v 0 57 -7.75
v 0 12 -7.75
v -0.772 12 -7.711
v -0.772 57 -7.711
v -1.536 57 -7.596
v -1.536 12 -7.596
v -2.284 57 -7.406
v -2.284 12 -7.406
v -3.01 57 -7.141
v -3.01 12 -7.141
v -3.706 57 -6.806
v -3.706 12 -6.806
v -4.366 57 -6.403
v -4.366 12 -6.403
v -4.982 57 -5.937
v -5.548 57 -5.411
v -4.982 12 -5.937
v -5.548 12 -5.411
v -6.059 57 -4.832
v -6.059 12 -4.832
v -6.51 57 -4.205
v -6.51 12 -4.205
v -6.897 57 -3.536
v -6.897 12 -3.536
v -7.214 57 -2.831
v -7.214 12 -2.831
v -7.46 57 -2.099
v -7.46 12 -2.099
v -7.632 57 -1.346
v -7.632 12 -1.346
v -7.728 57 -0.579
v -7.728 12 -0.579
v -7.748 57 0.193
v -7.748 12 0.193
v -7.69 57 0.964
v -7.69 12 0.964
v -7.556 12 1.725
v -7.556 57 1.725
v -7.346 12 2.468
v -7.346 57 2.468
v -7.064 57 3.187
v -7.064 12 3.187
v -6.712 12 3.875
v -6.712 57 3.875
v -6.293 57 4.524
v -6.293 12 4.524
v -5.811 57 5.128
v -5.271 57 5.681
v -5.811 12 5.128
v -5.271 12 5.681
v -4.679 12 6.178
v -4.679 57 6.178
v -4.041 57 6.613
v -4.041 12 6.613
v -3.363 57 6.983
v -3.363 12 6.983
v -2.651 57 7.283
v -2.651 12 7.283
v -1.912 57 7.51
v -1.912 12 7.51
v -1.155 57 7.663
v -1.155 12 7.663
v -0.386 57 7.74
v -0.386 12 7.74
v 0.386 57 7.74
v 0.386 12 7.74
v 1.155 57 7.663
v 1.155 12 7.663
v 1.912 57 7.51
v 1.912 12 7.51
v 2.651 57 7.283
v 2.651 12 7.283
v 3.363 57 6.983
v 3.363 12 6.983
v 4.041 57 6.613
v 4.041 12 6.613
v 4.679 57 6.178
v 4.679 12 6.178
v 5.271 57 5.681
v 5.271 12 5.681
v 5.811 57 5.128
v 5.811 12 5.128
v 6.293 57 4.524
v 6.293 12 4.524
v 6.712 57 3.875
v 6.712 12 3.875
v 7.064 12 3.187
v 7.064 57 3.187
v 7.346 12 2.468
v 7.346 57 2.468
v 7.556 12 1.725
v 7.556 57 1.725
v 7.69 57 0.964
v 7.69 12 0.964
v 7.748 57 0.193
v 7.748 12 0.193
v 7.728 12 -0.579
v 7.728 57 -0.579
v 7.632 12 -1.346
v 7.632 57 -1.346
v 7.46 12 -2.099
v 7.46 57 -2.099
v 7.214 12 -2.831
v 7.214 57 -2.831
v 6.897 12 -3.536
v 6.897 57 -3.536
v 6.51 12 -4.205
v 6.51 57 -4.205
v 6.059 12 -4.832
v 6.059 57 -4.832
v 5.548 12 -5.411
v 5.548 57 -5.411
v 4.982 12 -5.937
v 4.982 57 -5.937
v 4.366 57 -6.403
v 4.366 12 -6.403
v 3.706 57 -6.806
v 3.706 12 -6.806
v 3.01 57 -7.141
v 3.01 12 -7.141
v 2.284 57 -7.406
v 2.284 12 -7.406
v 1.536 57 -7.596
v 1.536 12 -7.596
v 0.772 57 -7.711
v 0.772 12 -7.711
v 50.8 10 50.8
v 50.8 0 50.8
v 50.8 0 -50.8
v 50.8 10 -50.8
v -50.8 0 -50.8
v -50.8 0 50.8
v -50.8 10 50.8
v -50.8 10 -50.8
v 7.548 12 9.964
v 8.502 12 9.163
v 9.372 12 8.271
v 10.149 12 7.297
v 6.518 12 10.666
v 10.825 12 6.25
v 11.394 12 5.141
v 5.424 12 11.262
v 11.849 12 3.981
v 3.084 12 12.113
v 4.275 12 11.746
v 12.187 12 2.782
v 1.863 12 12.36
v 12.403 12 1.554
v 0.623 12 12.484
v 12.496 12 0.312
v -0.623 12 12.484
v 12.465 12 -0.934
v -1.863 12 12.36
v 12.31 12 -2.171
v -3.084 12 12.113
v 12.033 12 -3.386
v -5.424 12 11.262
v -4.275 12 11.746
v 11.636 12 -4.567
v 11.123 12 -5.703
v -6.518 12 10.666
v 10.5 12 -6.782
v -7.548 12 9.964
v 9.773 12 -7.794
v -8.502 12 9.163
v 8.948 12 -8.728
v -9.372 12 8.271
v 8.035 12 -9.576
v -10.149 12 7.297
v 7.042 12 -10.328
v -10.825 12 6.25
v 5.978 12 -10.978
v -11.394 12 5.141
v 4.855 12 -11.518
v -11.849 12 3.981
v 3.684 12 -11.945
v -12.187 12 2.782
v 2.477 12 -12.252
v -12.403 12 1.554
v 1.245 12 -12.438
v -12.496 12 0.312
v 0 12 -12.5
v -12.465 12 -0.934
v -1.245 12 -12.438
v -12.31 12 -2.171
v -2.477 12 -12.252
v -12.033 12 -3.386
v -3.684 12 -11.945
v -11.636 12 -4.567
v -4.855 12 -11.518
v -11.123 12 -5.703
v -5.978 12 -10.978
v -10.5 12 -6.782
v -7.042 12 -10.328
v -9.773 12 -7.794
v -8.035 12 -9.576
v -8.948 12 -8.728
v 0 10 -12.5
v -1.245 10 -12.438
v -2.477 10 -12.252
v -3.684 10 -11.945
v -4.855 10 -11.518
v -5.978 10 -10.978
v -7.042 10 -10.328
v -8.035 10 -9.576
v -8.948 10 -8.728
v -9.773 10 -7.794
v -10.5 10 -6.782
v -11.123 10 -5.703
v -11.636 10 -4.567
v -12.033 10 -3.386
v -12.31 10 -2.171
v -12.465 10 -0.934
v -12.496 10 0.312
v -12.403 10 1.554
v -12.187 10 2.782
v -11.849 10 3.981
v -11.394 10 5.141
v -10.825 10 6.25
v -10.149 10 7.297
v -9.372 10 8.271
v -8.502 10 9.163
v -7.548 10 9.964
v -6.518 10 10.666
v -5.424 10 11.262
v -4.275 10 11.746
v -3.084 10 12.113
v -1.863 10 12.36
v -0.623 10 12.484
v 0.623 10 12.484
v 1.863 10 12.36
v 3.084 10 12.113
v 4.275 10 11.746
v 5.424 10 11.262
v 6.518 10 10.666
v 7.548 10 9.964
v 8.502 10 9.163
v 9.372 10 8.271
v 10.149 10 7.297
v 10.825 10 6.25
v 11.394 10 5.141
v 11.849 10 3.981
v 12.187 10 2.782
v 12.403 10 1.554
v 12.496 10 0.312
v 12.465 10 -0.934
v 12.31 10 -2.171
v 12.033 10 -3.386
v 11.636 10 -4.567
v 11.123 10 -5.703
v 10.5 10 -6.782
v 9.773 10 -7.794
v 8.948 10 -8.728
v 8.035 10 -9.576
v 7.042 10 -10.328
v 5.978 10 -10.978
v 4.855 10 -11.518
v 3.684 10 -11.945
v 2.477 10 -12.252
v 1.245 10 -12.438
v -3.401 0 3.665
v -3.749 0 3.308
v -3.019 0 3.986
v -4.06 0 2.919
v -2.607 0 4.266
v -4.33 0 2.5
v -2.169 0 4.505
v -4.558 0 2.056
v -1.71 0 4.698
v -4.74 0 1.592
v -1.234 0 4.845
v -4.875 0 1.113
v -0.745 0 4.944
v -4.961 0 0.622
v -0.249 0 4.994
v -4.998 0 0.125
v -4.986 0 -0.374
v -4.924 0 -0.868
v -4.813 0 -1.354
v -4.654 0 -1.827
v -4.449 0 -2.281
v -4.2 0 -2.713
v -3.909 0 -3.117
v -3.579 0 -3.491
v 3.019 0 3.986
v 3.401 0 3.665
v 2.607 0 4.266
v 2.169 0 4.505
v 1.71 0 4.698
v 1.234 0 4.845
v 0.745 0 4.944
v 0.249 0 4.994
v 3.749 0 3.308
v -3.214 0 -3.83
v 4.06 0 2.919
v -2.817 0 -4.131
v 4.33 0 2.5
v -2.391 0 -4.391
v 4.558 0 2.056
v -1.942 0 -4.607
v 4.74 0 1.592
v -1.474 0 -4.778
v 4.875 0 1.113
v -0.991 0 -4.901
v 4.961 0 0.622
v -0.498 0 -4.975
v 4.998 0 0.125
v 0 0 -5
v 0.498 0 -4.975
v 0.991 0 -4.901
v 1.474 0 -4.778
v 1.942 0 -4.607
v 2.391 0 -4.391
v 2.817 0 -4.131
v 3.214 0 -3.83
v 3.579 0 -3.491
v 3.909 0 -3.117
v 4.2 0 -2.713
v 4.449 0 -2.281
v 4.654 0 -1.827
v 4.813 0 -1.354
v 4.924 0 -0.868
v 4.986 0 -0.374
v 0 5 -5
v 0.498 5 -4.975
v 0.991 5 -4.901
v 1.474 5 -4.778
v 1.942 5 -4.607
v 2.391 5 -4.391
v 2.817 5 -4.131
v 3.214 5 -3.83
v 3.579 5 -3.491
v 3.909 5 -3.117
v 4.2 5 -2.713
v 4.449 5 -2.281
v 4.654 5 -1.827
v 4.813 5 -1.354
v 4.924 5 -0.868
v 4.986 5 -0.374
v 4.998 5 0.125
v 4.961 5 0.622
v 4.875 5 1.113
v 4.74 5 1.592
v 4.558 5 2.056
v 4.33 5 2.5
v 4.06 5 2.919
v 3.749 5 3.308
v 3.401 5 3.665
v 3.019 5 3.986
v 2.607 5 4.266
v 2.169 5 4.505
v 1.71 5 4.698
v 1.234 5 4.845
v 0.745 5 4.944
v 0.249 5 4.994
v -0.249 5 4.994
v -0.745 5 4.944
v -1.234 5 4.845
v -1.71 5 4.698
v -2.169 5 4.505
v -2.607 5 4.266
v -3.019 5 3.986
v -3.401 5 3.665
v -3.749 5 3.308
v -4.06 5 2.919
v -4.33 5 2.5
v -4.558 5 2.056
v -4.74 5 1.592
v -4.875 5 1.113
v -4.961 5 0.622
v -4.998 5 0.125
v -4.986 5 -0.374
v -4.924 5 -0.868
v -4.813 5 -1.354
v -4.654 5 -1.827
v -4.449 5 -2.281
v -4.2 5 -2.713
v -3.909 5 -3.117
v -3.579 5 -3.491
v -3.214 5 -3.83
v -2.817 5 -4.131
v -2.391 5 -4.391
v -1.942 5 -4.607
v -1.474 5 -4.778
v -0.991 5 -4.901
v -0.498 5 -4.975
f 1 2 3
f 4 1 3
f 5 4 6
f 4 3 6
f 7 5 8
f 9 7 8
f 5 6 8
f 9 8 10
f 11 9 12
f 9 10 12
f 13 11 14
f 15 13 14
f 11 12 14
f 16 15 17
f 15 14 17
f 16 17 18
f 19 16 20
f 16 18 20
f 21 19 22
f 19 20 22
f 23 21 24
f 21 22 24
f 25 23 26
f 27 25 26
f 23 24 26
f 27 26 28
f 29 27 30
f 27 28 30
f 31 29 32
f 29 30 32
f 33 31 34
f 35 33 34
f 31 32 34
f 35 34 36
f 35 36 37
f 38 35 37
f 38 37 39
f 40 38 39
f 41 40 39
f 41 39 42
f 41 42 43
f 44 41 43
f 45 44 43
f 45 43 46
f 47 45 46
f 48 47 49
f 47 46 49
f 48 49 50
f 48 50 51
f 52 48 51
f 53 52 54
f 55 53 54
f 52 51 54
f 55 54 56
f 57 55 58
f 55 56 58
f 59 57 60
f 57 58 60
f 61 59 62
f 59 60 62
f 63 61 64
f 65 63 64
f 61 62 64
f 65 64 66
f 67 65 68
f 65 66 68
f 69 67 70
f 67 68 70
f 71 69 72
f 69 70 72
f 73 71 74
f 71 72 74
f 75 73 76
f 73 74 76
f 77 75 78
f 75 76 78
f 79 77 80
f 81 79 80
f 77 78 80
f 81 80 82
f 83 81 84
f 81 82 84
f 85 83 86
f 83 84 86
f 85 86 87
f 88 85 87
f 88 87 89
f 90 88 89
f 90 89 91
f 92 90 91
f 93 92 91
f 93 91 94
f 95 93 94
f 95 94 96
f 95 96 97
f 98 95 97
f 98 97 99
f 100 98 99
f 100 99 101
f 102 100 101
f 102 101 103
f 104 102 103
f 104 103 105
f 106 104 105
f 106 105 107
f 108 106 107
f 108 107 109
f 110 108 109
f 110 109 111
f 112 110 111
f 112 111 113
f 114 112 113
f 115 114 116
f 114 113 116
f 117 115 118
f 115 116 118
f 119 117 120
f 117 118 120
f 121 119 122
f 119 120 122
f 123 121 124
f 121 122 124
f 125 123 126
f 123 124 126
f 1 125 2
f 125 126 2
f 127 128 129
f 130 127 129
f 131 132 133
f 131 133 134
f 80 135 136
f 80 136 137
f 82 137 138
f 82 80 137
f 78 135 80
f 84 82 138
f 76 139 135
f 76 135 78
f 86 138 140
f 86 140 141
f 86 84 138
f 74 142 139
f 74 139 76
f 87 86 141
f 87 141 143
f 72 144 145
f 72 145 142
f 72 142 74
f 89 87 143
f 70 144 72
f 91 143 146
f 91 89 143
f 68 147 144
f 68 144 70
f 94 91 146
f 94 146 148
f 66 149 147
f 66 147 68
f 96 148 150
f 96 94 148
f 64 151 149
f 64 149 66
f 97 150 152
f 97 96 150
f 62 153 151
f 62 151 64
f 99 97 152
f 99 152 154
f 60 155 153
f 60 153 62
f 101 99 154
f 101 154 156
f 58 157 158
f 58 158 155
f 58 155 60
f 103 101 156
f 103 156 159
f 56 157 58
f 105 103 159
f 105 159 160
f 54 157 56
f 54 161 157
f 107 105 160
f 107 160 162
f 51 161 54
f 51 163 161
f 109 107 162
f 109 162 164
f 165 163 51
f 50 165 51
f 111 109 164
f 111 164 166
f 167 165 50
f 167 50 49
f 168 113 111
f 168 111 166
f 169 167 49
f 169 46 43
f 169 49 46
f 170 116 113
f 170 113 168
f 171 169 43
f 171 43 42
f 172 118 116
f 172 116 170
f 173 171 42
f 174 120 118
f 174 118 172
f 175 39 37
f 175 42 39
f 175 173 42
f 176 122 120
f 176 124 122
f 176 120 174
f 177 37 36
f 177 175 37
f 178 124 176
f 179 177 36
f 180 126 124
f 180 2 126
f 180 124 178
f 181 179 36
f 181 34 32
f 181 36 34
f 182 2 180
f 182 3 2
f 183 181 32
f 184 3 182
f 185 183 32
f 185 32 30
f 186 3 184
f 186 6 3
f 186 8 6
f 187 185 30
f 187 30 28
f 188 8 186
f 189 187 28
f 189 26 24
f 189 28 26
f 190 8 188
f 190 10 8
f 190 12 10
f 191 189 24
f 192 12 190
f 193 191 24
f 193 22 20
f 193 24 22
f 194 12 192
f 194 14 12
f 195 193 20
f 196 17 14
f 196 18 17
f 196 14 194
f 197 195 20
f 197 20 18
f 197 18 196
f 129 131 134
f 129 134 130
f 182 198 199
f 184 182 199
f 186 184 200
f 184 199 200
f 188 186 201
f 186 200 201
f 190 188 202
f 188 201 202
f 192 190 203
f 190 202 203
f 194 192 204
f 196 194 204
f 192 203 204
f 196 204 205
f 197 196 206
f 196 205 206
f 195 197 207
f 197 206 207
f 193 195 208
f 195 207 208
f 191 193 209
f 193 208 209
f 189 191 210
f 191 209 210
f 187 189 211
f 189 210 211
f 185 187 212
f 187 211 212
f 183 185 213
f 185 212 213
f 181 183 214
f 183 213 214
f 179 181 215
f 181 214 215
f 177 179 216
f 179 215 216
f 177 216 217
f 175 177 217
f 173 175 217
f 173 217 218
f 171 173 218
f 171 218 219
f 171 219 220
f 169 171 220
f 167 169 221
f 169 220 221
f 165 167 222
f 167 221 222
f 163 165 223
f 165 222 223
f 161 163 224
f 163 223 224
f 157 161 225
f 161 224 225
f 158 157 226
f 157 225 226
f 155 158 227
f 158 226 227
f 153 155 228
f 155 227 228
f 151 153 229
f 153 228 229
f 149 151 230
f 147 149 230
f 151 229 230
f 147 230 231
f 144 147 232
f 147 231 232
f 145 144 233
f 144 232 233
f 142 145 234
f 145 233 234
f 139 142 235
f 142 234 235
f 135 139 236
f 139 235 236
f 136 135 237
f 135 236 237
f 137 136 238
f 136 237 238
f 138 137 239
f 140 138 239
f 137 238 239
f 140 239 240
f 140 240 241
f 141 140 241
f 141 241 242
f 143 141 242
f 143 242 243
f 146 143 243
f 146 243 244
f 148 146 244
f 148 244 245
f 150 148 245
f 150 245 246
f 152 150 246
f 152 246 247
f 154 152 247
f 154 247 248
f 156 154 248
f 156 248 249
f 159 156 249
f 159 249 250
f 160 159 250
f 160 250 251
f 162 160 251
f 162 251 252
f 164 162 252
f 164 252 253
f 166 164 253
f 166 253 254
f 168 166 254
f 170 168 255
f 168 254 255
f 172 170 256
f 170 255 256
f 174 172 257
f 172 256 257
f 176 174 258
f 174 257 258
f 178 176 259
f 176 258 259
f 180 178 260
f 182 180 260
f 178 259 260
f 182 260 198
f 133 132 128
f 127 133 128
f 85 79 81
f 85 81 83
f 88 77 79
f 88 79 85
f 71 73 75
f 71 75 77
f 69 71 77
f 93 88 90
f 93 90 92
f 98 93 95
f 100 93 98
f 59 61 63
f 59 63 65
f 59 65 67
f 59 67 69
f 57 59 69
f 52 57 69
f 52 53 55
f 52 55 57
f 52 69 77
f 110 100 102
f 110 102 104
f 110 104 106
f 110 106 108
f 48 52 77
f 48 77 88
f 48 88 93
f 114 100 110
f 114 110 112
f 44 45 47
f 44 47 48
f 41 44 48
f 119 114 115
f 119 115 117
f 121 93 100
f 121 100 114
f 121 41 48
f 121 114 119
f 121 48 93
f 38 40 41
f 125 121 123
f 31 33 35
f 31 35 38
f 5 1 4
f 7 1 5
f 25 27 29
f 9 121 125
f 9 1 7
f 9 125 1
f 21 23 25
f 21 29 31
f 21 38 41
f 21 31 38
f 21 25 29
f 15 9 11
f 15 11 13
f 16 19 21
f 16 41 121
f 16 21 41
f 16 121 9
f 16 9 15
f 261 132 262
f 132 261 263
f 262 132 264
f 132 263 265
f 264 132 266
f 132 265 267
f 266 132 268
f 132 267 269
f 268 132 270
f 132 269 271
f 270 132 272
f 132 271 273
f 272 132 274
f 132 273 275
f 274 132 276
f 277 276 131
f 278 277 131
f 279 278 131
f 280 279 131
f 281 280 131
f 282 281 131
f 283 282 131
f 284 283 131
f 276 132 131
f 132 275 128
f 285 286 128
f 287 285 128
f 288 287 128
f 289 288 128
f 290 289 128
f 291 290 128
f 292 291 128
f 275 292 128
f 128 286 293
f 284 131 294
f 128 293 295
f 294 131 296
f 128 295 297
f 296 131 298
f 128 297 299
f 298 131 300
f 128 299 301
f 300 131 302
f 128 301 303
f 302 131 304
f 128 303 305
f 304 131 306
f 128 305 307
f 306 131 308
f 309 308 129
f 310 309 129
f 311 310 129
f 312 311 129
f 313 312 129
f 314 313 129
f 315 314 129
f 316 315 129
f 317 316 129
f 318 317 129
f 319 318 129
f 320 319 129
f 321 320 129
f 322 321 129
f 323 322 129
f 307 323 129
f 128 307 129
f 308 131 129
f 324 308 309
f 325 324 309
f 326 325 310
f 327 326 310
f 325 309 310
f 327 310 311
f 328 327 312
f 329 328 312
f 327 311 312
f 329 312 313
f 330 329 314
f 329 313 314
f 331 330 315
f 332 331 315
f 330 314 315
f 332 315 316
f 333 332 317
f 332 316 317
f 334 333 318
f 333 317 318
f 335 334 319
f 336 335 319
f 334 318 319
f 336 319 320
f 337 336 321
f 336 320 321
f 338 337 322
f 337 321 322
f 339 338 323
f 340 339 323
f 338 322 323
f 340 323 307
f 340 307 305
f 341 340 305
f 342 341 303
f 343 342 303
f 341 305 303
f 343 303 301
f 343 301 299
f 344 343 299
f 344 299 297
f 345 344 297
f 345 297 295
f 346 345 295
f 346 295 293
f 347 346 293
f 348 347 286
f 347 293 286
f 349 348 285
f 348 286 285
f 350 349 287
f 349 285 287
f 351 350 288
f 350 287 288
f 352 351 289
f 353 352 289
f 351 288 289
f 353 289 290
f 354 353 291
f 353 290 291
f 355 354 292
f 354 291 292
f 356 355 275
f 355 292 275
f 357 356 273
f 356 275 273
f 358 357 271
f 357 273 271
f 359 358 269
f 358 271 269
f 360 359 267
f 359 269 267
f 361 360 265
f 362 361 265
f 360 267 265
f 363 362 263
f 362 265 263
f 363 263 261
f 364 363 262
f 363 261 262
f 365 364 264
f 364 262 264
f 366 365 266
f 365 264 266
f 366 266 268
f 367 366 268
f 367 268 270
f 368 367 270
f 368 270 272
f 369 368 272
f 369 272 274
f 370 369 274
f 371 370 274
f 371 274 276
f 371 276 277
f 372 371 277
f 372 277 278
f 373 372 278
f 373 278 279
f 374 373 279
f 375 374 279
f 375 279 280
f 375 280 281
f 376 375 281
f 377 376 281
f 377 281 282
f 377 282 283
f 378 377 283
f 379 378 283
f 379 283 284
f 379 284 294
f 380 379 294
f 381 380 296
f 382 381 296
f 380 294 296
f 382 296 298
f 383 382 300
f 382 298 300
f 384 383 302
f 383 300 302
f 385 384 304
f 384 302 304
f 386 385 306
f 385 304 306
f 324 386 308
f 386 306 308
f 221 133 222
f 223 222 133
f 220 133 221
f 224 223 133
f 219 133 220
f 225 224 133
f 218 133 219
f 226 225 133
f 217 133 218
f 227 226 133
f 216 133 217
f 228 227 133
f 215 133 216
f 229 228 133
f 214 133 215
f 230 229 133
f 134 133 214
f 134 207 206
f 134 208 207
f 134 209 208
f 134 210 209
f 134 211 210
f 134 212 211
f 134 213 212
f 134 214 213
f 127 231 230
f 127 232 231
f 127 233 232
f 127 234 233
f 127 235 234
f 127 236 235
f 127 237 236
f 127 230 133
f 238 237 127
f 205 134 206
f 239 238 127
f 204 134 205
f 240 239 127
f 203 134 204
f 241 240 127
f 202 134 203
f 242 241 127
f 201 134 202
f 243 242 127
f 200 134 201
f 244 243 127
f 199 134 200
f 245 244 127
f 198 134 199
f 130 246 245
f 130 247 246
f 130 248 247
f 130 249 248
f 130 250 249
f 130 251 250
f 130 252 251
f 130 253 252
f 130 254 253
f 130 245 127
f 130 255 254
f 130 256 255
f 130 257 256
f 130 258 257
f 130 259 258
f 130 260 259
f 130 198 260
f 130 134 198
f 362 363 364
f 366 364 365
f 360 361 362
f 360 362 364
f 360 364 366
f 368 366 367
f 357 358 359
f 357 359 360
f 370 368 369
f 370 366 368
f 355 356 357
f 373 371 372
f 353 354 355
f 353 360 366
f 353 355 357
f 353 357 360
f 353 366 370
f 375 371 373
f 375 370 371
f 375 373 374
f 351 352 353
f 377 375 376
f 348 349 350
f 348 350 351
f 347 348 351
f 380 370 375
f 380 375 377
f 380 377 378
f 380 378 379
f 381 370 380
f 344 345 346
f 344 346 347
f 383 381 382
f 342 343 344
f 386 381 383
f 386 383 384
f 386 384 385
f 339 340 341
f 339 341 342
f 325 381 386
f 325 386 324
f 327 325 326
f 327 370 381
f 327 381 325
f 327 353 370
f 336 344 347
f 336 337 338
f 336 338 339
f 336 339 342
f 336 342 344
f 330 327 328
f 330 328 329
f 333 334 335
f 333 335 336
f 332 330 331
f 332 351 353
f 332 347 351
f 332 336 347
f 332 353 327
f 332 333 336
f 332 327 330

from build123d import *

# Parameters (mm, degrees)
SKETCH1_W           = 101.6
SKETCH1_H           = 101.6
BOSS_EXTRUDE1_DEPTH = 10
SKETCH2_R           = 5
CUT_EXTRUDE1_DEPTH  = 5
SKETCH3_R           = 12.5
BOSS_EXTRUDE2_DEPTH = 2
SKETCH4_R           = 7.75
BOSS_EXTRUDE3_DEPTH = 45


with BuildPart() as part:
    # Sketch1 → Boss-Extrude1 (new body)
    with BuildSketch(Plane(origin=(0, 0, 0), x_dir=(1, 0, 0), z_dir=(0, 1, 0))):
        Rectangle(SKETCH1_W, SKETCH1_H)
    extrude(amount=BOSS_EXTRUDE1_DEPTH)

    # Sketch2 → Cut-Extrude1 (cut)
    with BuildSketch(Plane(origin=(0, 0, 0), x_dir=(-1, 0, 0), z_dir=(0, -1, 0))):
        with Locations(Location((0, 0, 0), (0, 0, 90))):
            Circle(SKETCH2_R)
    extrude(amount=-CUT_EXTRUDE1_DEPTH, mode=Mode.SUBTRACT)

    # Sketch3 → Boss-Extrude2 (add)
    with BuildSketch(Plane(origin=(0, 10, 0), x_dir=(1, 0, 0), z_dir=(0, 1, 0))):
        with Locations(Location((0, 0, 0), (0, 0, 90))):
            Circle(SKETCH3_R)
    extrude(amount=BOSS_EXTRUDE2_DEPTH)

    # Sketch4 → Boss-Extrude3 (add)
    with BuildSketch(Plane(origin=(0, 12, 0), x_dir=(1, 0, 0), z_dir=(0, 1, 0))):
        with Locations(Location((0, 0, 0), (0, 0, 90))):
            Circle(SKETCH4_R)
    extrude(amount=BOSS_EXTRUDE3_DEPTH)


solid = part.part
